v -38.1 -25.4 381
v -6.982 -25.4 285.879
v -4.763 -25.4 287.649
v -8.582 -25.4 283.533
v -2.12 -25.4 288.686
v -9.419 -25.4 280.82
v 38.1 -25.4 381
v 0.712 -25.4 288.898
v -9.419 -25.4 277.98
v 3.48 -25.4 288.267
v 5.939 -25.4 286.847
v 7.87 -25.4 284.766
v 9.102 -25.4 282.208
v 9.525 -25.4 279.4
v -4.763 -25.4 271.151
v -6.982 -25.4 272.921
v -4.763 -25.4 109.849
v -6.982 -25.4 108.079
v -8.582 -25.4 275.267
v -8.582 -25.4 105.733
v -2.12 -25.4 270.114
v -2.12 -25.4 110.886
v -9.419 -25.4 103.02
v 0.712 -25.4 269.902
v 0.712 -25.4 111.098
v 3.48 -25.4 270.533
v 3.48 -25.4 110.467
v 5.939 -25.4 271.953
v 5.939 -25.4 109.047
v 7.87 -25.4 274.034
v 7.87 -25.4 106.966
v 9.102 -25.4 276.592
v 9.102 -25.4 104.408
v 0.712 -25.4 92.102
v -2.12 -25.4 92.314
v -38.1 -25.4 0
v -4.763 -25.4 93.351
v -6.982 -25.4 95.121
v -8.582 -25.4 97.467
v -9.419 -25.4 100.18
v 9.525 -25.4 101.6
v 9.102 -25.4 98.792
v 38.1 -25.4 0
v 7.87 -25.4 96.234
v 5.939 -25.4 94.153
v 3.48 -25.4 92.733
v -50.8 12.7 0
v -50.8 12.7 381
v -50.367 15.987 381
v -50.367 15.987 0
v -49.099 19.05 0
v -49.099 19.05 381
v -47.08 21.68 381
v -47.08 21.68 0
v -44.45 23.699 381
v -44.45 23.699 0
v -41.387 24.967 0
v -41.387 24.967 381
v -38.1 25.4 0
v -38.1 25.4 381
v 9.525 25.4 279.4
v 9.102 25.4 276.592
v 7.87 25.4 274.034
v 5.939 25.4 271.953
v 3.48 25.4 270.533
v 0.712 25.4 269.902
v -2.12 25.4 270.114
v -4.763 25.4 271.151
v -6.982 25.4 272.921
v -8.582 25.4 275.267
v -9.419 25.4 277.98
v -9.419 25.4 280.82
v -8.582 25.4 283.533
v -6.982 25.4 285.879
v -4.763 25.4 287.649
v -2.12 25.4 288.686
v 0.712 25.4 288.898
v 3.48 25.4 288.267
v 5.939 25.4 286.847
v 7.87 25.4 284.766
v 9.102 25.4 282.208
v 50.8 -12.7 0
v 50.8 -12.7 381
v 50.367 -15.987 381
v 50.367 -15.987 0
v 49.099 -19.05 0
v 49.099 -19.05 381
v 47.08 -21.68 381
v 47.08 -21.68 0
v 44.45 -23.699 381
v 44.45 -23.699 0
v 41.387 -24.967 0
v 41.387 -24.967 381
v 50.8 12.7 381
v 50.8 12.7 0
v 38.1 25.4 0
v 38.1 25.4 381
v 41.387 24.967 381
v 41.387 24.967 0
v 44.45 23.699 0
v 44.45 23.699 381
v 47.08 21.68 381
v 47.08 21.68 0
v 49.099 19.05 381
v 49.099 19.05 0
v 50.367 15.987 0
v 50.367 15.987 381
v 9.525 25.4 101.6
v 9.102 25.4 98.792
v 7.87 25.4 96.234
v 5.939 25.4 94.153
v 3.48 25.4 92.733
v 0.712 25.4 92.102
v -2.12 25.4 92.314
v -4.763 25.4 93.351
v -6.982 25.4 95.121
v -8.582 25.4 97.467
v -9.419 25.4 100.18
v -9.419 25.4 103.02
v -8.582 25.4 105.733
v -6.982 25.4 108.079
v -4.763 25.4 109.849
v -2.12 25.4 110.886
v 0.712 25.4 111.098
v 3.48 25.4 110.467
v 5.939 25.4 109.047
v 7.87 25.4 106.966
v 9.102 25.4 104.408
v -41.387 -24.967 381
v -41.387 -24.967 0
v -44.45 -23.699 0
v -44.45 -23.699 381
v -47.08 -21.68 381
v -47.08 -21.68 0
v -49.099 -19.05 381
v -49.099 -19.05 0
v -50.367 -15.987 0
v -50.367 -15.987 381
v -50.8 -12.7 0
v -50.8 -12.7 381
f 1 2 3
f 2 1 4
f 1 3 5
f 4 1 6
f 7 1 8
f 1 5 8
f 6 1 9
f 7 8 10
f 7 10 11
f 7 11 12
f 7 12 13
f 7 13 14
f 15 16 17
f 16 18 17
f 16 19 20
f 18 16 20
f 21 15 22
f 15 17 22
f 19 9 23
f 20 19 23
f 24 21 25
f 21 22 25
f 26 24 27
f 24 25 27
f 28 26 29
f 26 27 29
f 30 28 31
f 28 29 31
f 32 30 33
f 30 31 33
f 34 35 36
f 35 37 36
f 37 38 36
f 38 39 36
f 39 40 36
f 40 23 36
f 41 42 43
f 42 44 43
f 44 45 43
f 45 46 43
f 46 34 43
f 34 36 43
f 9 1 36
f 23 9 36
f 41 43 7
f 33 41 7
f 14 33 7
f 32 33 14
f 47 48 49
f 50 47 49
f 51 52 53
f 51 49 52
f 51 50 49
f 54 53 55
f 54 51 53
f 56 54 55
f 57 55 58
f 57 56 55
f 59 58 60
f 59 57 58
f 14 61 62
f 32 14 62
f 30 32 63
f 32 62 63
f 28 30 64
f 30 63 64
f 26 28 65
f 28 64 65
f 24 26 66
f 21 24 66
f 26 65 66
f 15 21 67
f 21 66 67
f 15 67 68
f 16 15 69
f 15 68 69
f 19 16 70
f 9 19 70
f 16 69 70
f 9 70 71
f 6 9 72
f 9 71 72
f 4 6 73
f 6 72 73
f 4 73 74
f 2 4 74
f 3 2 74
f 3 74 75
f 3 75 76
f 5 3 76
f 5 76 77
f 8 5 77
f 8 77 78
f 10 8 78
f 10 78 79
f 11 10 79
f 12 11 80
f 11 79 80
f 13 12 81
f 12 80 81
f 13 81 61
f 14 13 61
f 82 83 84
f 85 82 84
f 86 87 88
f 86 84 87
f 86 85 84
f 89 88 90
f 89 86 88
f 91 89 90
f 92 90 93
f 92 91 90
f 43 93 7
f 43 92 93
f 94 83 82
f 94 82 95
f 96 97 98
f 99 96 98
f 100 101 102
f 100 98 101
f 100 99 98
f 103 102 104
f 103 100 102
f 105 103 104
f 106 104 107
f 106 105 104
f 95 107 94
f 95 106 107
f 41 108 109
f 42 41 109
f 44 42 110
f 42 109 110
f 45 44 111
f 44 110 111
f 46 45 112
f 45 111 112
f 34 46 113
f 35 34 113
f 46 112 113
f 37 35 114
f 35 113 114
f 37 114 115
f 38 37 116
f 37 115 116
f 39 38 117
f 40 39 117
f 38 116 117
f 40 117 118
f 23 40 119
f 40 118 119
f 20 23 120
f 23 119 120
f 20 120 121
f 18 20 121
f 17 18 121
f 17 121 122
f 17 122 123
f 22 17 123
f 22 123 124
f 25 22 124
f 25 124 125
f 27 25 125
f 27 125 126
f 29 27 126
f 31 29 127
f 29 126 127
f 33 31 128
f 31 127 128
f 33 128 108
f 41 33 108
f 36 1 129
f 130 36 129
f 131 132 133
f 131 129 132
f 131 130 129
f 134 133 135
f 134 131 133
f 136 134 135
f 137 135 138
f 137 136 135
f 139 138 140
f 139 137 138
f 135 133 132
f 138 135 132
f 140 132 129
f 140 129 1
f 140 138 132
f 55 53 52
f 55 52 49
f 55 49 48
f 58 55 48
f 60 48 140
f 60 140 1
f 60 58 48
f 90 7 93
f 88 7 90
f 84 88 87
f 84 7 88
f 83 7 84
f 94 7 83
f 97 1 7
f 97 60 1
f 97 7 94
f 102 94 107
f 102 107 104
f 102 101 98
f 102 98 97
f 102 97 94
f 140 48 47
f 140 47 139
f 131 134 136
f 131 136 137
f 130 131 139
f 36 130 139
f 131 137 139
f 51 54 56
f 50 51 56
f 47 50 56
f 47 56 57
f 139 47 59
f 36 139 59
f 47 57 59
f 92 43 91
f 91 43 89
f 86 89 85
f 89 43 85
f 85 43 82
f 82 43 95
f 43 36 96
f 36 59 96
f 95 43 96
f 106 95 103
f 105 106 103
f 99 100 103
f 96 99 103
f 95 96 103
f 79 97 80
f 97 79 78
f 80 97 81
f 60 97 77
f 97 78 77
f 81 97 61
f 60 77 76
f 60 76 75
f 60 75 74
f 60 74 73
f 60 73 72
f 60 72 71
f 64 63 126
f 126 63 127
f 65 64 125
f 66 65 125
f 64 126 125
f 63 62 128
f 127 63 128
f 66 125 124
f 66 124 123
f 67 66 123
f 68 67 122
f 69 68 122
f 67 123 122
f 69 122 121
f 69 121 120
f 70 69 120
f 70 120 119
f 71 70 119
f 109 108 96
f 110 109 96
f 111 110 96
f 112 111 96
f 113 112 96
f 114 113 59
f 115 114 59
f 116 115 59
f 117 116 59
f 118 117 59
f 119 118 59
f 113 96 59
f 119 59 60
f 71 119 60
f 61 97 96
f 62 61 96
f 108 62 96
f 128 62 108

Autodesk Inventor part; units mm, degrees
ref_plane "YZ Plane" through (0, 0, 0) normal (1, 0, 0) x (0, 1, 0)
ref_plane "XZ Plane" through (0, 0, 0) normal (0, 1, 0) x (-1, 0, 0)
ref_plane "XY Plane" through (0, 0, 0) normal (0, 0, 1) x (1, 0, 0)
sketch "Sketch1" plane through (0, 0, 0) normal (0, 0, 1) x (1, 0, 0)
  line L0 (-38.1, -25.4) -> (38.1, -25.4)
  line L1 (50.8, -12.7) -> (50.8, 12.7)
  line L2 (38.1, 25.4) -> (-38.1, 25.4)
  line L3 (-50.8, 12.7) -> (-50.8, -12.7)
  line L4 (-50.8, -25.4) -> (50.8, 25.4) construction
  line L5 (50.8, -25.4) -> (-50.8, 25.4) construction
  arc A0 (-38.1, 25.4) -> (-50.8, 12.7) centre (-38.1, 12.7) ccw
  arc A1 (-50.8, -12.7) -> (-38.1, -25.4) centre (-38.1, -12.7) ccw
  arc A2 (38.1, -25.4) -> (50.8, -12.7) centre (38.1, -12.7) ccw
  arc A3 (50.8, 12.7) -> (38.1, 25.4) centre (38.1, 12.7) ccw
  point P0 (0, 0)
  dimension "d0" = 12.7
  dimension "d1" = 101.6
  dimension "d2" = 50.8
extrude "Extrusion1" add sketch "Sketch1" along normal blind 381
sketch "Sketch2" plane through (-38.1, 25.4, 0) normal (0, 1, 0) x (1, 0, 0)
  circle A0 centre (38.1, -279.4) radius 9.525
  circle A1 centre (38.1, -101.6) radius 9.525
  line L0 (-12.7, 0) -> (-12.7, -381) projected
  line L1 (76.2, 0) -> (0, 0) projected
  point P0 (38.1, 0)
  point P1 (-12.7, -190.5)
  point P2 (38.1, 0)
  dimension "d6" = 88.9
  dimension "d7" = 19.05
  dimension "d8" = 177.8
extrude "Extrusion2" cut sketch "Sketch2" against normal blind 381
properties part number "Wood-1"
